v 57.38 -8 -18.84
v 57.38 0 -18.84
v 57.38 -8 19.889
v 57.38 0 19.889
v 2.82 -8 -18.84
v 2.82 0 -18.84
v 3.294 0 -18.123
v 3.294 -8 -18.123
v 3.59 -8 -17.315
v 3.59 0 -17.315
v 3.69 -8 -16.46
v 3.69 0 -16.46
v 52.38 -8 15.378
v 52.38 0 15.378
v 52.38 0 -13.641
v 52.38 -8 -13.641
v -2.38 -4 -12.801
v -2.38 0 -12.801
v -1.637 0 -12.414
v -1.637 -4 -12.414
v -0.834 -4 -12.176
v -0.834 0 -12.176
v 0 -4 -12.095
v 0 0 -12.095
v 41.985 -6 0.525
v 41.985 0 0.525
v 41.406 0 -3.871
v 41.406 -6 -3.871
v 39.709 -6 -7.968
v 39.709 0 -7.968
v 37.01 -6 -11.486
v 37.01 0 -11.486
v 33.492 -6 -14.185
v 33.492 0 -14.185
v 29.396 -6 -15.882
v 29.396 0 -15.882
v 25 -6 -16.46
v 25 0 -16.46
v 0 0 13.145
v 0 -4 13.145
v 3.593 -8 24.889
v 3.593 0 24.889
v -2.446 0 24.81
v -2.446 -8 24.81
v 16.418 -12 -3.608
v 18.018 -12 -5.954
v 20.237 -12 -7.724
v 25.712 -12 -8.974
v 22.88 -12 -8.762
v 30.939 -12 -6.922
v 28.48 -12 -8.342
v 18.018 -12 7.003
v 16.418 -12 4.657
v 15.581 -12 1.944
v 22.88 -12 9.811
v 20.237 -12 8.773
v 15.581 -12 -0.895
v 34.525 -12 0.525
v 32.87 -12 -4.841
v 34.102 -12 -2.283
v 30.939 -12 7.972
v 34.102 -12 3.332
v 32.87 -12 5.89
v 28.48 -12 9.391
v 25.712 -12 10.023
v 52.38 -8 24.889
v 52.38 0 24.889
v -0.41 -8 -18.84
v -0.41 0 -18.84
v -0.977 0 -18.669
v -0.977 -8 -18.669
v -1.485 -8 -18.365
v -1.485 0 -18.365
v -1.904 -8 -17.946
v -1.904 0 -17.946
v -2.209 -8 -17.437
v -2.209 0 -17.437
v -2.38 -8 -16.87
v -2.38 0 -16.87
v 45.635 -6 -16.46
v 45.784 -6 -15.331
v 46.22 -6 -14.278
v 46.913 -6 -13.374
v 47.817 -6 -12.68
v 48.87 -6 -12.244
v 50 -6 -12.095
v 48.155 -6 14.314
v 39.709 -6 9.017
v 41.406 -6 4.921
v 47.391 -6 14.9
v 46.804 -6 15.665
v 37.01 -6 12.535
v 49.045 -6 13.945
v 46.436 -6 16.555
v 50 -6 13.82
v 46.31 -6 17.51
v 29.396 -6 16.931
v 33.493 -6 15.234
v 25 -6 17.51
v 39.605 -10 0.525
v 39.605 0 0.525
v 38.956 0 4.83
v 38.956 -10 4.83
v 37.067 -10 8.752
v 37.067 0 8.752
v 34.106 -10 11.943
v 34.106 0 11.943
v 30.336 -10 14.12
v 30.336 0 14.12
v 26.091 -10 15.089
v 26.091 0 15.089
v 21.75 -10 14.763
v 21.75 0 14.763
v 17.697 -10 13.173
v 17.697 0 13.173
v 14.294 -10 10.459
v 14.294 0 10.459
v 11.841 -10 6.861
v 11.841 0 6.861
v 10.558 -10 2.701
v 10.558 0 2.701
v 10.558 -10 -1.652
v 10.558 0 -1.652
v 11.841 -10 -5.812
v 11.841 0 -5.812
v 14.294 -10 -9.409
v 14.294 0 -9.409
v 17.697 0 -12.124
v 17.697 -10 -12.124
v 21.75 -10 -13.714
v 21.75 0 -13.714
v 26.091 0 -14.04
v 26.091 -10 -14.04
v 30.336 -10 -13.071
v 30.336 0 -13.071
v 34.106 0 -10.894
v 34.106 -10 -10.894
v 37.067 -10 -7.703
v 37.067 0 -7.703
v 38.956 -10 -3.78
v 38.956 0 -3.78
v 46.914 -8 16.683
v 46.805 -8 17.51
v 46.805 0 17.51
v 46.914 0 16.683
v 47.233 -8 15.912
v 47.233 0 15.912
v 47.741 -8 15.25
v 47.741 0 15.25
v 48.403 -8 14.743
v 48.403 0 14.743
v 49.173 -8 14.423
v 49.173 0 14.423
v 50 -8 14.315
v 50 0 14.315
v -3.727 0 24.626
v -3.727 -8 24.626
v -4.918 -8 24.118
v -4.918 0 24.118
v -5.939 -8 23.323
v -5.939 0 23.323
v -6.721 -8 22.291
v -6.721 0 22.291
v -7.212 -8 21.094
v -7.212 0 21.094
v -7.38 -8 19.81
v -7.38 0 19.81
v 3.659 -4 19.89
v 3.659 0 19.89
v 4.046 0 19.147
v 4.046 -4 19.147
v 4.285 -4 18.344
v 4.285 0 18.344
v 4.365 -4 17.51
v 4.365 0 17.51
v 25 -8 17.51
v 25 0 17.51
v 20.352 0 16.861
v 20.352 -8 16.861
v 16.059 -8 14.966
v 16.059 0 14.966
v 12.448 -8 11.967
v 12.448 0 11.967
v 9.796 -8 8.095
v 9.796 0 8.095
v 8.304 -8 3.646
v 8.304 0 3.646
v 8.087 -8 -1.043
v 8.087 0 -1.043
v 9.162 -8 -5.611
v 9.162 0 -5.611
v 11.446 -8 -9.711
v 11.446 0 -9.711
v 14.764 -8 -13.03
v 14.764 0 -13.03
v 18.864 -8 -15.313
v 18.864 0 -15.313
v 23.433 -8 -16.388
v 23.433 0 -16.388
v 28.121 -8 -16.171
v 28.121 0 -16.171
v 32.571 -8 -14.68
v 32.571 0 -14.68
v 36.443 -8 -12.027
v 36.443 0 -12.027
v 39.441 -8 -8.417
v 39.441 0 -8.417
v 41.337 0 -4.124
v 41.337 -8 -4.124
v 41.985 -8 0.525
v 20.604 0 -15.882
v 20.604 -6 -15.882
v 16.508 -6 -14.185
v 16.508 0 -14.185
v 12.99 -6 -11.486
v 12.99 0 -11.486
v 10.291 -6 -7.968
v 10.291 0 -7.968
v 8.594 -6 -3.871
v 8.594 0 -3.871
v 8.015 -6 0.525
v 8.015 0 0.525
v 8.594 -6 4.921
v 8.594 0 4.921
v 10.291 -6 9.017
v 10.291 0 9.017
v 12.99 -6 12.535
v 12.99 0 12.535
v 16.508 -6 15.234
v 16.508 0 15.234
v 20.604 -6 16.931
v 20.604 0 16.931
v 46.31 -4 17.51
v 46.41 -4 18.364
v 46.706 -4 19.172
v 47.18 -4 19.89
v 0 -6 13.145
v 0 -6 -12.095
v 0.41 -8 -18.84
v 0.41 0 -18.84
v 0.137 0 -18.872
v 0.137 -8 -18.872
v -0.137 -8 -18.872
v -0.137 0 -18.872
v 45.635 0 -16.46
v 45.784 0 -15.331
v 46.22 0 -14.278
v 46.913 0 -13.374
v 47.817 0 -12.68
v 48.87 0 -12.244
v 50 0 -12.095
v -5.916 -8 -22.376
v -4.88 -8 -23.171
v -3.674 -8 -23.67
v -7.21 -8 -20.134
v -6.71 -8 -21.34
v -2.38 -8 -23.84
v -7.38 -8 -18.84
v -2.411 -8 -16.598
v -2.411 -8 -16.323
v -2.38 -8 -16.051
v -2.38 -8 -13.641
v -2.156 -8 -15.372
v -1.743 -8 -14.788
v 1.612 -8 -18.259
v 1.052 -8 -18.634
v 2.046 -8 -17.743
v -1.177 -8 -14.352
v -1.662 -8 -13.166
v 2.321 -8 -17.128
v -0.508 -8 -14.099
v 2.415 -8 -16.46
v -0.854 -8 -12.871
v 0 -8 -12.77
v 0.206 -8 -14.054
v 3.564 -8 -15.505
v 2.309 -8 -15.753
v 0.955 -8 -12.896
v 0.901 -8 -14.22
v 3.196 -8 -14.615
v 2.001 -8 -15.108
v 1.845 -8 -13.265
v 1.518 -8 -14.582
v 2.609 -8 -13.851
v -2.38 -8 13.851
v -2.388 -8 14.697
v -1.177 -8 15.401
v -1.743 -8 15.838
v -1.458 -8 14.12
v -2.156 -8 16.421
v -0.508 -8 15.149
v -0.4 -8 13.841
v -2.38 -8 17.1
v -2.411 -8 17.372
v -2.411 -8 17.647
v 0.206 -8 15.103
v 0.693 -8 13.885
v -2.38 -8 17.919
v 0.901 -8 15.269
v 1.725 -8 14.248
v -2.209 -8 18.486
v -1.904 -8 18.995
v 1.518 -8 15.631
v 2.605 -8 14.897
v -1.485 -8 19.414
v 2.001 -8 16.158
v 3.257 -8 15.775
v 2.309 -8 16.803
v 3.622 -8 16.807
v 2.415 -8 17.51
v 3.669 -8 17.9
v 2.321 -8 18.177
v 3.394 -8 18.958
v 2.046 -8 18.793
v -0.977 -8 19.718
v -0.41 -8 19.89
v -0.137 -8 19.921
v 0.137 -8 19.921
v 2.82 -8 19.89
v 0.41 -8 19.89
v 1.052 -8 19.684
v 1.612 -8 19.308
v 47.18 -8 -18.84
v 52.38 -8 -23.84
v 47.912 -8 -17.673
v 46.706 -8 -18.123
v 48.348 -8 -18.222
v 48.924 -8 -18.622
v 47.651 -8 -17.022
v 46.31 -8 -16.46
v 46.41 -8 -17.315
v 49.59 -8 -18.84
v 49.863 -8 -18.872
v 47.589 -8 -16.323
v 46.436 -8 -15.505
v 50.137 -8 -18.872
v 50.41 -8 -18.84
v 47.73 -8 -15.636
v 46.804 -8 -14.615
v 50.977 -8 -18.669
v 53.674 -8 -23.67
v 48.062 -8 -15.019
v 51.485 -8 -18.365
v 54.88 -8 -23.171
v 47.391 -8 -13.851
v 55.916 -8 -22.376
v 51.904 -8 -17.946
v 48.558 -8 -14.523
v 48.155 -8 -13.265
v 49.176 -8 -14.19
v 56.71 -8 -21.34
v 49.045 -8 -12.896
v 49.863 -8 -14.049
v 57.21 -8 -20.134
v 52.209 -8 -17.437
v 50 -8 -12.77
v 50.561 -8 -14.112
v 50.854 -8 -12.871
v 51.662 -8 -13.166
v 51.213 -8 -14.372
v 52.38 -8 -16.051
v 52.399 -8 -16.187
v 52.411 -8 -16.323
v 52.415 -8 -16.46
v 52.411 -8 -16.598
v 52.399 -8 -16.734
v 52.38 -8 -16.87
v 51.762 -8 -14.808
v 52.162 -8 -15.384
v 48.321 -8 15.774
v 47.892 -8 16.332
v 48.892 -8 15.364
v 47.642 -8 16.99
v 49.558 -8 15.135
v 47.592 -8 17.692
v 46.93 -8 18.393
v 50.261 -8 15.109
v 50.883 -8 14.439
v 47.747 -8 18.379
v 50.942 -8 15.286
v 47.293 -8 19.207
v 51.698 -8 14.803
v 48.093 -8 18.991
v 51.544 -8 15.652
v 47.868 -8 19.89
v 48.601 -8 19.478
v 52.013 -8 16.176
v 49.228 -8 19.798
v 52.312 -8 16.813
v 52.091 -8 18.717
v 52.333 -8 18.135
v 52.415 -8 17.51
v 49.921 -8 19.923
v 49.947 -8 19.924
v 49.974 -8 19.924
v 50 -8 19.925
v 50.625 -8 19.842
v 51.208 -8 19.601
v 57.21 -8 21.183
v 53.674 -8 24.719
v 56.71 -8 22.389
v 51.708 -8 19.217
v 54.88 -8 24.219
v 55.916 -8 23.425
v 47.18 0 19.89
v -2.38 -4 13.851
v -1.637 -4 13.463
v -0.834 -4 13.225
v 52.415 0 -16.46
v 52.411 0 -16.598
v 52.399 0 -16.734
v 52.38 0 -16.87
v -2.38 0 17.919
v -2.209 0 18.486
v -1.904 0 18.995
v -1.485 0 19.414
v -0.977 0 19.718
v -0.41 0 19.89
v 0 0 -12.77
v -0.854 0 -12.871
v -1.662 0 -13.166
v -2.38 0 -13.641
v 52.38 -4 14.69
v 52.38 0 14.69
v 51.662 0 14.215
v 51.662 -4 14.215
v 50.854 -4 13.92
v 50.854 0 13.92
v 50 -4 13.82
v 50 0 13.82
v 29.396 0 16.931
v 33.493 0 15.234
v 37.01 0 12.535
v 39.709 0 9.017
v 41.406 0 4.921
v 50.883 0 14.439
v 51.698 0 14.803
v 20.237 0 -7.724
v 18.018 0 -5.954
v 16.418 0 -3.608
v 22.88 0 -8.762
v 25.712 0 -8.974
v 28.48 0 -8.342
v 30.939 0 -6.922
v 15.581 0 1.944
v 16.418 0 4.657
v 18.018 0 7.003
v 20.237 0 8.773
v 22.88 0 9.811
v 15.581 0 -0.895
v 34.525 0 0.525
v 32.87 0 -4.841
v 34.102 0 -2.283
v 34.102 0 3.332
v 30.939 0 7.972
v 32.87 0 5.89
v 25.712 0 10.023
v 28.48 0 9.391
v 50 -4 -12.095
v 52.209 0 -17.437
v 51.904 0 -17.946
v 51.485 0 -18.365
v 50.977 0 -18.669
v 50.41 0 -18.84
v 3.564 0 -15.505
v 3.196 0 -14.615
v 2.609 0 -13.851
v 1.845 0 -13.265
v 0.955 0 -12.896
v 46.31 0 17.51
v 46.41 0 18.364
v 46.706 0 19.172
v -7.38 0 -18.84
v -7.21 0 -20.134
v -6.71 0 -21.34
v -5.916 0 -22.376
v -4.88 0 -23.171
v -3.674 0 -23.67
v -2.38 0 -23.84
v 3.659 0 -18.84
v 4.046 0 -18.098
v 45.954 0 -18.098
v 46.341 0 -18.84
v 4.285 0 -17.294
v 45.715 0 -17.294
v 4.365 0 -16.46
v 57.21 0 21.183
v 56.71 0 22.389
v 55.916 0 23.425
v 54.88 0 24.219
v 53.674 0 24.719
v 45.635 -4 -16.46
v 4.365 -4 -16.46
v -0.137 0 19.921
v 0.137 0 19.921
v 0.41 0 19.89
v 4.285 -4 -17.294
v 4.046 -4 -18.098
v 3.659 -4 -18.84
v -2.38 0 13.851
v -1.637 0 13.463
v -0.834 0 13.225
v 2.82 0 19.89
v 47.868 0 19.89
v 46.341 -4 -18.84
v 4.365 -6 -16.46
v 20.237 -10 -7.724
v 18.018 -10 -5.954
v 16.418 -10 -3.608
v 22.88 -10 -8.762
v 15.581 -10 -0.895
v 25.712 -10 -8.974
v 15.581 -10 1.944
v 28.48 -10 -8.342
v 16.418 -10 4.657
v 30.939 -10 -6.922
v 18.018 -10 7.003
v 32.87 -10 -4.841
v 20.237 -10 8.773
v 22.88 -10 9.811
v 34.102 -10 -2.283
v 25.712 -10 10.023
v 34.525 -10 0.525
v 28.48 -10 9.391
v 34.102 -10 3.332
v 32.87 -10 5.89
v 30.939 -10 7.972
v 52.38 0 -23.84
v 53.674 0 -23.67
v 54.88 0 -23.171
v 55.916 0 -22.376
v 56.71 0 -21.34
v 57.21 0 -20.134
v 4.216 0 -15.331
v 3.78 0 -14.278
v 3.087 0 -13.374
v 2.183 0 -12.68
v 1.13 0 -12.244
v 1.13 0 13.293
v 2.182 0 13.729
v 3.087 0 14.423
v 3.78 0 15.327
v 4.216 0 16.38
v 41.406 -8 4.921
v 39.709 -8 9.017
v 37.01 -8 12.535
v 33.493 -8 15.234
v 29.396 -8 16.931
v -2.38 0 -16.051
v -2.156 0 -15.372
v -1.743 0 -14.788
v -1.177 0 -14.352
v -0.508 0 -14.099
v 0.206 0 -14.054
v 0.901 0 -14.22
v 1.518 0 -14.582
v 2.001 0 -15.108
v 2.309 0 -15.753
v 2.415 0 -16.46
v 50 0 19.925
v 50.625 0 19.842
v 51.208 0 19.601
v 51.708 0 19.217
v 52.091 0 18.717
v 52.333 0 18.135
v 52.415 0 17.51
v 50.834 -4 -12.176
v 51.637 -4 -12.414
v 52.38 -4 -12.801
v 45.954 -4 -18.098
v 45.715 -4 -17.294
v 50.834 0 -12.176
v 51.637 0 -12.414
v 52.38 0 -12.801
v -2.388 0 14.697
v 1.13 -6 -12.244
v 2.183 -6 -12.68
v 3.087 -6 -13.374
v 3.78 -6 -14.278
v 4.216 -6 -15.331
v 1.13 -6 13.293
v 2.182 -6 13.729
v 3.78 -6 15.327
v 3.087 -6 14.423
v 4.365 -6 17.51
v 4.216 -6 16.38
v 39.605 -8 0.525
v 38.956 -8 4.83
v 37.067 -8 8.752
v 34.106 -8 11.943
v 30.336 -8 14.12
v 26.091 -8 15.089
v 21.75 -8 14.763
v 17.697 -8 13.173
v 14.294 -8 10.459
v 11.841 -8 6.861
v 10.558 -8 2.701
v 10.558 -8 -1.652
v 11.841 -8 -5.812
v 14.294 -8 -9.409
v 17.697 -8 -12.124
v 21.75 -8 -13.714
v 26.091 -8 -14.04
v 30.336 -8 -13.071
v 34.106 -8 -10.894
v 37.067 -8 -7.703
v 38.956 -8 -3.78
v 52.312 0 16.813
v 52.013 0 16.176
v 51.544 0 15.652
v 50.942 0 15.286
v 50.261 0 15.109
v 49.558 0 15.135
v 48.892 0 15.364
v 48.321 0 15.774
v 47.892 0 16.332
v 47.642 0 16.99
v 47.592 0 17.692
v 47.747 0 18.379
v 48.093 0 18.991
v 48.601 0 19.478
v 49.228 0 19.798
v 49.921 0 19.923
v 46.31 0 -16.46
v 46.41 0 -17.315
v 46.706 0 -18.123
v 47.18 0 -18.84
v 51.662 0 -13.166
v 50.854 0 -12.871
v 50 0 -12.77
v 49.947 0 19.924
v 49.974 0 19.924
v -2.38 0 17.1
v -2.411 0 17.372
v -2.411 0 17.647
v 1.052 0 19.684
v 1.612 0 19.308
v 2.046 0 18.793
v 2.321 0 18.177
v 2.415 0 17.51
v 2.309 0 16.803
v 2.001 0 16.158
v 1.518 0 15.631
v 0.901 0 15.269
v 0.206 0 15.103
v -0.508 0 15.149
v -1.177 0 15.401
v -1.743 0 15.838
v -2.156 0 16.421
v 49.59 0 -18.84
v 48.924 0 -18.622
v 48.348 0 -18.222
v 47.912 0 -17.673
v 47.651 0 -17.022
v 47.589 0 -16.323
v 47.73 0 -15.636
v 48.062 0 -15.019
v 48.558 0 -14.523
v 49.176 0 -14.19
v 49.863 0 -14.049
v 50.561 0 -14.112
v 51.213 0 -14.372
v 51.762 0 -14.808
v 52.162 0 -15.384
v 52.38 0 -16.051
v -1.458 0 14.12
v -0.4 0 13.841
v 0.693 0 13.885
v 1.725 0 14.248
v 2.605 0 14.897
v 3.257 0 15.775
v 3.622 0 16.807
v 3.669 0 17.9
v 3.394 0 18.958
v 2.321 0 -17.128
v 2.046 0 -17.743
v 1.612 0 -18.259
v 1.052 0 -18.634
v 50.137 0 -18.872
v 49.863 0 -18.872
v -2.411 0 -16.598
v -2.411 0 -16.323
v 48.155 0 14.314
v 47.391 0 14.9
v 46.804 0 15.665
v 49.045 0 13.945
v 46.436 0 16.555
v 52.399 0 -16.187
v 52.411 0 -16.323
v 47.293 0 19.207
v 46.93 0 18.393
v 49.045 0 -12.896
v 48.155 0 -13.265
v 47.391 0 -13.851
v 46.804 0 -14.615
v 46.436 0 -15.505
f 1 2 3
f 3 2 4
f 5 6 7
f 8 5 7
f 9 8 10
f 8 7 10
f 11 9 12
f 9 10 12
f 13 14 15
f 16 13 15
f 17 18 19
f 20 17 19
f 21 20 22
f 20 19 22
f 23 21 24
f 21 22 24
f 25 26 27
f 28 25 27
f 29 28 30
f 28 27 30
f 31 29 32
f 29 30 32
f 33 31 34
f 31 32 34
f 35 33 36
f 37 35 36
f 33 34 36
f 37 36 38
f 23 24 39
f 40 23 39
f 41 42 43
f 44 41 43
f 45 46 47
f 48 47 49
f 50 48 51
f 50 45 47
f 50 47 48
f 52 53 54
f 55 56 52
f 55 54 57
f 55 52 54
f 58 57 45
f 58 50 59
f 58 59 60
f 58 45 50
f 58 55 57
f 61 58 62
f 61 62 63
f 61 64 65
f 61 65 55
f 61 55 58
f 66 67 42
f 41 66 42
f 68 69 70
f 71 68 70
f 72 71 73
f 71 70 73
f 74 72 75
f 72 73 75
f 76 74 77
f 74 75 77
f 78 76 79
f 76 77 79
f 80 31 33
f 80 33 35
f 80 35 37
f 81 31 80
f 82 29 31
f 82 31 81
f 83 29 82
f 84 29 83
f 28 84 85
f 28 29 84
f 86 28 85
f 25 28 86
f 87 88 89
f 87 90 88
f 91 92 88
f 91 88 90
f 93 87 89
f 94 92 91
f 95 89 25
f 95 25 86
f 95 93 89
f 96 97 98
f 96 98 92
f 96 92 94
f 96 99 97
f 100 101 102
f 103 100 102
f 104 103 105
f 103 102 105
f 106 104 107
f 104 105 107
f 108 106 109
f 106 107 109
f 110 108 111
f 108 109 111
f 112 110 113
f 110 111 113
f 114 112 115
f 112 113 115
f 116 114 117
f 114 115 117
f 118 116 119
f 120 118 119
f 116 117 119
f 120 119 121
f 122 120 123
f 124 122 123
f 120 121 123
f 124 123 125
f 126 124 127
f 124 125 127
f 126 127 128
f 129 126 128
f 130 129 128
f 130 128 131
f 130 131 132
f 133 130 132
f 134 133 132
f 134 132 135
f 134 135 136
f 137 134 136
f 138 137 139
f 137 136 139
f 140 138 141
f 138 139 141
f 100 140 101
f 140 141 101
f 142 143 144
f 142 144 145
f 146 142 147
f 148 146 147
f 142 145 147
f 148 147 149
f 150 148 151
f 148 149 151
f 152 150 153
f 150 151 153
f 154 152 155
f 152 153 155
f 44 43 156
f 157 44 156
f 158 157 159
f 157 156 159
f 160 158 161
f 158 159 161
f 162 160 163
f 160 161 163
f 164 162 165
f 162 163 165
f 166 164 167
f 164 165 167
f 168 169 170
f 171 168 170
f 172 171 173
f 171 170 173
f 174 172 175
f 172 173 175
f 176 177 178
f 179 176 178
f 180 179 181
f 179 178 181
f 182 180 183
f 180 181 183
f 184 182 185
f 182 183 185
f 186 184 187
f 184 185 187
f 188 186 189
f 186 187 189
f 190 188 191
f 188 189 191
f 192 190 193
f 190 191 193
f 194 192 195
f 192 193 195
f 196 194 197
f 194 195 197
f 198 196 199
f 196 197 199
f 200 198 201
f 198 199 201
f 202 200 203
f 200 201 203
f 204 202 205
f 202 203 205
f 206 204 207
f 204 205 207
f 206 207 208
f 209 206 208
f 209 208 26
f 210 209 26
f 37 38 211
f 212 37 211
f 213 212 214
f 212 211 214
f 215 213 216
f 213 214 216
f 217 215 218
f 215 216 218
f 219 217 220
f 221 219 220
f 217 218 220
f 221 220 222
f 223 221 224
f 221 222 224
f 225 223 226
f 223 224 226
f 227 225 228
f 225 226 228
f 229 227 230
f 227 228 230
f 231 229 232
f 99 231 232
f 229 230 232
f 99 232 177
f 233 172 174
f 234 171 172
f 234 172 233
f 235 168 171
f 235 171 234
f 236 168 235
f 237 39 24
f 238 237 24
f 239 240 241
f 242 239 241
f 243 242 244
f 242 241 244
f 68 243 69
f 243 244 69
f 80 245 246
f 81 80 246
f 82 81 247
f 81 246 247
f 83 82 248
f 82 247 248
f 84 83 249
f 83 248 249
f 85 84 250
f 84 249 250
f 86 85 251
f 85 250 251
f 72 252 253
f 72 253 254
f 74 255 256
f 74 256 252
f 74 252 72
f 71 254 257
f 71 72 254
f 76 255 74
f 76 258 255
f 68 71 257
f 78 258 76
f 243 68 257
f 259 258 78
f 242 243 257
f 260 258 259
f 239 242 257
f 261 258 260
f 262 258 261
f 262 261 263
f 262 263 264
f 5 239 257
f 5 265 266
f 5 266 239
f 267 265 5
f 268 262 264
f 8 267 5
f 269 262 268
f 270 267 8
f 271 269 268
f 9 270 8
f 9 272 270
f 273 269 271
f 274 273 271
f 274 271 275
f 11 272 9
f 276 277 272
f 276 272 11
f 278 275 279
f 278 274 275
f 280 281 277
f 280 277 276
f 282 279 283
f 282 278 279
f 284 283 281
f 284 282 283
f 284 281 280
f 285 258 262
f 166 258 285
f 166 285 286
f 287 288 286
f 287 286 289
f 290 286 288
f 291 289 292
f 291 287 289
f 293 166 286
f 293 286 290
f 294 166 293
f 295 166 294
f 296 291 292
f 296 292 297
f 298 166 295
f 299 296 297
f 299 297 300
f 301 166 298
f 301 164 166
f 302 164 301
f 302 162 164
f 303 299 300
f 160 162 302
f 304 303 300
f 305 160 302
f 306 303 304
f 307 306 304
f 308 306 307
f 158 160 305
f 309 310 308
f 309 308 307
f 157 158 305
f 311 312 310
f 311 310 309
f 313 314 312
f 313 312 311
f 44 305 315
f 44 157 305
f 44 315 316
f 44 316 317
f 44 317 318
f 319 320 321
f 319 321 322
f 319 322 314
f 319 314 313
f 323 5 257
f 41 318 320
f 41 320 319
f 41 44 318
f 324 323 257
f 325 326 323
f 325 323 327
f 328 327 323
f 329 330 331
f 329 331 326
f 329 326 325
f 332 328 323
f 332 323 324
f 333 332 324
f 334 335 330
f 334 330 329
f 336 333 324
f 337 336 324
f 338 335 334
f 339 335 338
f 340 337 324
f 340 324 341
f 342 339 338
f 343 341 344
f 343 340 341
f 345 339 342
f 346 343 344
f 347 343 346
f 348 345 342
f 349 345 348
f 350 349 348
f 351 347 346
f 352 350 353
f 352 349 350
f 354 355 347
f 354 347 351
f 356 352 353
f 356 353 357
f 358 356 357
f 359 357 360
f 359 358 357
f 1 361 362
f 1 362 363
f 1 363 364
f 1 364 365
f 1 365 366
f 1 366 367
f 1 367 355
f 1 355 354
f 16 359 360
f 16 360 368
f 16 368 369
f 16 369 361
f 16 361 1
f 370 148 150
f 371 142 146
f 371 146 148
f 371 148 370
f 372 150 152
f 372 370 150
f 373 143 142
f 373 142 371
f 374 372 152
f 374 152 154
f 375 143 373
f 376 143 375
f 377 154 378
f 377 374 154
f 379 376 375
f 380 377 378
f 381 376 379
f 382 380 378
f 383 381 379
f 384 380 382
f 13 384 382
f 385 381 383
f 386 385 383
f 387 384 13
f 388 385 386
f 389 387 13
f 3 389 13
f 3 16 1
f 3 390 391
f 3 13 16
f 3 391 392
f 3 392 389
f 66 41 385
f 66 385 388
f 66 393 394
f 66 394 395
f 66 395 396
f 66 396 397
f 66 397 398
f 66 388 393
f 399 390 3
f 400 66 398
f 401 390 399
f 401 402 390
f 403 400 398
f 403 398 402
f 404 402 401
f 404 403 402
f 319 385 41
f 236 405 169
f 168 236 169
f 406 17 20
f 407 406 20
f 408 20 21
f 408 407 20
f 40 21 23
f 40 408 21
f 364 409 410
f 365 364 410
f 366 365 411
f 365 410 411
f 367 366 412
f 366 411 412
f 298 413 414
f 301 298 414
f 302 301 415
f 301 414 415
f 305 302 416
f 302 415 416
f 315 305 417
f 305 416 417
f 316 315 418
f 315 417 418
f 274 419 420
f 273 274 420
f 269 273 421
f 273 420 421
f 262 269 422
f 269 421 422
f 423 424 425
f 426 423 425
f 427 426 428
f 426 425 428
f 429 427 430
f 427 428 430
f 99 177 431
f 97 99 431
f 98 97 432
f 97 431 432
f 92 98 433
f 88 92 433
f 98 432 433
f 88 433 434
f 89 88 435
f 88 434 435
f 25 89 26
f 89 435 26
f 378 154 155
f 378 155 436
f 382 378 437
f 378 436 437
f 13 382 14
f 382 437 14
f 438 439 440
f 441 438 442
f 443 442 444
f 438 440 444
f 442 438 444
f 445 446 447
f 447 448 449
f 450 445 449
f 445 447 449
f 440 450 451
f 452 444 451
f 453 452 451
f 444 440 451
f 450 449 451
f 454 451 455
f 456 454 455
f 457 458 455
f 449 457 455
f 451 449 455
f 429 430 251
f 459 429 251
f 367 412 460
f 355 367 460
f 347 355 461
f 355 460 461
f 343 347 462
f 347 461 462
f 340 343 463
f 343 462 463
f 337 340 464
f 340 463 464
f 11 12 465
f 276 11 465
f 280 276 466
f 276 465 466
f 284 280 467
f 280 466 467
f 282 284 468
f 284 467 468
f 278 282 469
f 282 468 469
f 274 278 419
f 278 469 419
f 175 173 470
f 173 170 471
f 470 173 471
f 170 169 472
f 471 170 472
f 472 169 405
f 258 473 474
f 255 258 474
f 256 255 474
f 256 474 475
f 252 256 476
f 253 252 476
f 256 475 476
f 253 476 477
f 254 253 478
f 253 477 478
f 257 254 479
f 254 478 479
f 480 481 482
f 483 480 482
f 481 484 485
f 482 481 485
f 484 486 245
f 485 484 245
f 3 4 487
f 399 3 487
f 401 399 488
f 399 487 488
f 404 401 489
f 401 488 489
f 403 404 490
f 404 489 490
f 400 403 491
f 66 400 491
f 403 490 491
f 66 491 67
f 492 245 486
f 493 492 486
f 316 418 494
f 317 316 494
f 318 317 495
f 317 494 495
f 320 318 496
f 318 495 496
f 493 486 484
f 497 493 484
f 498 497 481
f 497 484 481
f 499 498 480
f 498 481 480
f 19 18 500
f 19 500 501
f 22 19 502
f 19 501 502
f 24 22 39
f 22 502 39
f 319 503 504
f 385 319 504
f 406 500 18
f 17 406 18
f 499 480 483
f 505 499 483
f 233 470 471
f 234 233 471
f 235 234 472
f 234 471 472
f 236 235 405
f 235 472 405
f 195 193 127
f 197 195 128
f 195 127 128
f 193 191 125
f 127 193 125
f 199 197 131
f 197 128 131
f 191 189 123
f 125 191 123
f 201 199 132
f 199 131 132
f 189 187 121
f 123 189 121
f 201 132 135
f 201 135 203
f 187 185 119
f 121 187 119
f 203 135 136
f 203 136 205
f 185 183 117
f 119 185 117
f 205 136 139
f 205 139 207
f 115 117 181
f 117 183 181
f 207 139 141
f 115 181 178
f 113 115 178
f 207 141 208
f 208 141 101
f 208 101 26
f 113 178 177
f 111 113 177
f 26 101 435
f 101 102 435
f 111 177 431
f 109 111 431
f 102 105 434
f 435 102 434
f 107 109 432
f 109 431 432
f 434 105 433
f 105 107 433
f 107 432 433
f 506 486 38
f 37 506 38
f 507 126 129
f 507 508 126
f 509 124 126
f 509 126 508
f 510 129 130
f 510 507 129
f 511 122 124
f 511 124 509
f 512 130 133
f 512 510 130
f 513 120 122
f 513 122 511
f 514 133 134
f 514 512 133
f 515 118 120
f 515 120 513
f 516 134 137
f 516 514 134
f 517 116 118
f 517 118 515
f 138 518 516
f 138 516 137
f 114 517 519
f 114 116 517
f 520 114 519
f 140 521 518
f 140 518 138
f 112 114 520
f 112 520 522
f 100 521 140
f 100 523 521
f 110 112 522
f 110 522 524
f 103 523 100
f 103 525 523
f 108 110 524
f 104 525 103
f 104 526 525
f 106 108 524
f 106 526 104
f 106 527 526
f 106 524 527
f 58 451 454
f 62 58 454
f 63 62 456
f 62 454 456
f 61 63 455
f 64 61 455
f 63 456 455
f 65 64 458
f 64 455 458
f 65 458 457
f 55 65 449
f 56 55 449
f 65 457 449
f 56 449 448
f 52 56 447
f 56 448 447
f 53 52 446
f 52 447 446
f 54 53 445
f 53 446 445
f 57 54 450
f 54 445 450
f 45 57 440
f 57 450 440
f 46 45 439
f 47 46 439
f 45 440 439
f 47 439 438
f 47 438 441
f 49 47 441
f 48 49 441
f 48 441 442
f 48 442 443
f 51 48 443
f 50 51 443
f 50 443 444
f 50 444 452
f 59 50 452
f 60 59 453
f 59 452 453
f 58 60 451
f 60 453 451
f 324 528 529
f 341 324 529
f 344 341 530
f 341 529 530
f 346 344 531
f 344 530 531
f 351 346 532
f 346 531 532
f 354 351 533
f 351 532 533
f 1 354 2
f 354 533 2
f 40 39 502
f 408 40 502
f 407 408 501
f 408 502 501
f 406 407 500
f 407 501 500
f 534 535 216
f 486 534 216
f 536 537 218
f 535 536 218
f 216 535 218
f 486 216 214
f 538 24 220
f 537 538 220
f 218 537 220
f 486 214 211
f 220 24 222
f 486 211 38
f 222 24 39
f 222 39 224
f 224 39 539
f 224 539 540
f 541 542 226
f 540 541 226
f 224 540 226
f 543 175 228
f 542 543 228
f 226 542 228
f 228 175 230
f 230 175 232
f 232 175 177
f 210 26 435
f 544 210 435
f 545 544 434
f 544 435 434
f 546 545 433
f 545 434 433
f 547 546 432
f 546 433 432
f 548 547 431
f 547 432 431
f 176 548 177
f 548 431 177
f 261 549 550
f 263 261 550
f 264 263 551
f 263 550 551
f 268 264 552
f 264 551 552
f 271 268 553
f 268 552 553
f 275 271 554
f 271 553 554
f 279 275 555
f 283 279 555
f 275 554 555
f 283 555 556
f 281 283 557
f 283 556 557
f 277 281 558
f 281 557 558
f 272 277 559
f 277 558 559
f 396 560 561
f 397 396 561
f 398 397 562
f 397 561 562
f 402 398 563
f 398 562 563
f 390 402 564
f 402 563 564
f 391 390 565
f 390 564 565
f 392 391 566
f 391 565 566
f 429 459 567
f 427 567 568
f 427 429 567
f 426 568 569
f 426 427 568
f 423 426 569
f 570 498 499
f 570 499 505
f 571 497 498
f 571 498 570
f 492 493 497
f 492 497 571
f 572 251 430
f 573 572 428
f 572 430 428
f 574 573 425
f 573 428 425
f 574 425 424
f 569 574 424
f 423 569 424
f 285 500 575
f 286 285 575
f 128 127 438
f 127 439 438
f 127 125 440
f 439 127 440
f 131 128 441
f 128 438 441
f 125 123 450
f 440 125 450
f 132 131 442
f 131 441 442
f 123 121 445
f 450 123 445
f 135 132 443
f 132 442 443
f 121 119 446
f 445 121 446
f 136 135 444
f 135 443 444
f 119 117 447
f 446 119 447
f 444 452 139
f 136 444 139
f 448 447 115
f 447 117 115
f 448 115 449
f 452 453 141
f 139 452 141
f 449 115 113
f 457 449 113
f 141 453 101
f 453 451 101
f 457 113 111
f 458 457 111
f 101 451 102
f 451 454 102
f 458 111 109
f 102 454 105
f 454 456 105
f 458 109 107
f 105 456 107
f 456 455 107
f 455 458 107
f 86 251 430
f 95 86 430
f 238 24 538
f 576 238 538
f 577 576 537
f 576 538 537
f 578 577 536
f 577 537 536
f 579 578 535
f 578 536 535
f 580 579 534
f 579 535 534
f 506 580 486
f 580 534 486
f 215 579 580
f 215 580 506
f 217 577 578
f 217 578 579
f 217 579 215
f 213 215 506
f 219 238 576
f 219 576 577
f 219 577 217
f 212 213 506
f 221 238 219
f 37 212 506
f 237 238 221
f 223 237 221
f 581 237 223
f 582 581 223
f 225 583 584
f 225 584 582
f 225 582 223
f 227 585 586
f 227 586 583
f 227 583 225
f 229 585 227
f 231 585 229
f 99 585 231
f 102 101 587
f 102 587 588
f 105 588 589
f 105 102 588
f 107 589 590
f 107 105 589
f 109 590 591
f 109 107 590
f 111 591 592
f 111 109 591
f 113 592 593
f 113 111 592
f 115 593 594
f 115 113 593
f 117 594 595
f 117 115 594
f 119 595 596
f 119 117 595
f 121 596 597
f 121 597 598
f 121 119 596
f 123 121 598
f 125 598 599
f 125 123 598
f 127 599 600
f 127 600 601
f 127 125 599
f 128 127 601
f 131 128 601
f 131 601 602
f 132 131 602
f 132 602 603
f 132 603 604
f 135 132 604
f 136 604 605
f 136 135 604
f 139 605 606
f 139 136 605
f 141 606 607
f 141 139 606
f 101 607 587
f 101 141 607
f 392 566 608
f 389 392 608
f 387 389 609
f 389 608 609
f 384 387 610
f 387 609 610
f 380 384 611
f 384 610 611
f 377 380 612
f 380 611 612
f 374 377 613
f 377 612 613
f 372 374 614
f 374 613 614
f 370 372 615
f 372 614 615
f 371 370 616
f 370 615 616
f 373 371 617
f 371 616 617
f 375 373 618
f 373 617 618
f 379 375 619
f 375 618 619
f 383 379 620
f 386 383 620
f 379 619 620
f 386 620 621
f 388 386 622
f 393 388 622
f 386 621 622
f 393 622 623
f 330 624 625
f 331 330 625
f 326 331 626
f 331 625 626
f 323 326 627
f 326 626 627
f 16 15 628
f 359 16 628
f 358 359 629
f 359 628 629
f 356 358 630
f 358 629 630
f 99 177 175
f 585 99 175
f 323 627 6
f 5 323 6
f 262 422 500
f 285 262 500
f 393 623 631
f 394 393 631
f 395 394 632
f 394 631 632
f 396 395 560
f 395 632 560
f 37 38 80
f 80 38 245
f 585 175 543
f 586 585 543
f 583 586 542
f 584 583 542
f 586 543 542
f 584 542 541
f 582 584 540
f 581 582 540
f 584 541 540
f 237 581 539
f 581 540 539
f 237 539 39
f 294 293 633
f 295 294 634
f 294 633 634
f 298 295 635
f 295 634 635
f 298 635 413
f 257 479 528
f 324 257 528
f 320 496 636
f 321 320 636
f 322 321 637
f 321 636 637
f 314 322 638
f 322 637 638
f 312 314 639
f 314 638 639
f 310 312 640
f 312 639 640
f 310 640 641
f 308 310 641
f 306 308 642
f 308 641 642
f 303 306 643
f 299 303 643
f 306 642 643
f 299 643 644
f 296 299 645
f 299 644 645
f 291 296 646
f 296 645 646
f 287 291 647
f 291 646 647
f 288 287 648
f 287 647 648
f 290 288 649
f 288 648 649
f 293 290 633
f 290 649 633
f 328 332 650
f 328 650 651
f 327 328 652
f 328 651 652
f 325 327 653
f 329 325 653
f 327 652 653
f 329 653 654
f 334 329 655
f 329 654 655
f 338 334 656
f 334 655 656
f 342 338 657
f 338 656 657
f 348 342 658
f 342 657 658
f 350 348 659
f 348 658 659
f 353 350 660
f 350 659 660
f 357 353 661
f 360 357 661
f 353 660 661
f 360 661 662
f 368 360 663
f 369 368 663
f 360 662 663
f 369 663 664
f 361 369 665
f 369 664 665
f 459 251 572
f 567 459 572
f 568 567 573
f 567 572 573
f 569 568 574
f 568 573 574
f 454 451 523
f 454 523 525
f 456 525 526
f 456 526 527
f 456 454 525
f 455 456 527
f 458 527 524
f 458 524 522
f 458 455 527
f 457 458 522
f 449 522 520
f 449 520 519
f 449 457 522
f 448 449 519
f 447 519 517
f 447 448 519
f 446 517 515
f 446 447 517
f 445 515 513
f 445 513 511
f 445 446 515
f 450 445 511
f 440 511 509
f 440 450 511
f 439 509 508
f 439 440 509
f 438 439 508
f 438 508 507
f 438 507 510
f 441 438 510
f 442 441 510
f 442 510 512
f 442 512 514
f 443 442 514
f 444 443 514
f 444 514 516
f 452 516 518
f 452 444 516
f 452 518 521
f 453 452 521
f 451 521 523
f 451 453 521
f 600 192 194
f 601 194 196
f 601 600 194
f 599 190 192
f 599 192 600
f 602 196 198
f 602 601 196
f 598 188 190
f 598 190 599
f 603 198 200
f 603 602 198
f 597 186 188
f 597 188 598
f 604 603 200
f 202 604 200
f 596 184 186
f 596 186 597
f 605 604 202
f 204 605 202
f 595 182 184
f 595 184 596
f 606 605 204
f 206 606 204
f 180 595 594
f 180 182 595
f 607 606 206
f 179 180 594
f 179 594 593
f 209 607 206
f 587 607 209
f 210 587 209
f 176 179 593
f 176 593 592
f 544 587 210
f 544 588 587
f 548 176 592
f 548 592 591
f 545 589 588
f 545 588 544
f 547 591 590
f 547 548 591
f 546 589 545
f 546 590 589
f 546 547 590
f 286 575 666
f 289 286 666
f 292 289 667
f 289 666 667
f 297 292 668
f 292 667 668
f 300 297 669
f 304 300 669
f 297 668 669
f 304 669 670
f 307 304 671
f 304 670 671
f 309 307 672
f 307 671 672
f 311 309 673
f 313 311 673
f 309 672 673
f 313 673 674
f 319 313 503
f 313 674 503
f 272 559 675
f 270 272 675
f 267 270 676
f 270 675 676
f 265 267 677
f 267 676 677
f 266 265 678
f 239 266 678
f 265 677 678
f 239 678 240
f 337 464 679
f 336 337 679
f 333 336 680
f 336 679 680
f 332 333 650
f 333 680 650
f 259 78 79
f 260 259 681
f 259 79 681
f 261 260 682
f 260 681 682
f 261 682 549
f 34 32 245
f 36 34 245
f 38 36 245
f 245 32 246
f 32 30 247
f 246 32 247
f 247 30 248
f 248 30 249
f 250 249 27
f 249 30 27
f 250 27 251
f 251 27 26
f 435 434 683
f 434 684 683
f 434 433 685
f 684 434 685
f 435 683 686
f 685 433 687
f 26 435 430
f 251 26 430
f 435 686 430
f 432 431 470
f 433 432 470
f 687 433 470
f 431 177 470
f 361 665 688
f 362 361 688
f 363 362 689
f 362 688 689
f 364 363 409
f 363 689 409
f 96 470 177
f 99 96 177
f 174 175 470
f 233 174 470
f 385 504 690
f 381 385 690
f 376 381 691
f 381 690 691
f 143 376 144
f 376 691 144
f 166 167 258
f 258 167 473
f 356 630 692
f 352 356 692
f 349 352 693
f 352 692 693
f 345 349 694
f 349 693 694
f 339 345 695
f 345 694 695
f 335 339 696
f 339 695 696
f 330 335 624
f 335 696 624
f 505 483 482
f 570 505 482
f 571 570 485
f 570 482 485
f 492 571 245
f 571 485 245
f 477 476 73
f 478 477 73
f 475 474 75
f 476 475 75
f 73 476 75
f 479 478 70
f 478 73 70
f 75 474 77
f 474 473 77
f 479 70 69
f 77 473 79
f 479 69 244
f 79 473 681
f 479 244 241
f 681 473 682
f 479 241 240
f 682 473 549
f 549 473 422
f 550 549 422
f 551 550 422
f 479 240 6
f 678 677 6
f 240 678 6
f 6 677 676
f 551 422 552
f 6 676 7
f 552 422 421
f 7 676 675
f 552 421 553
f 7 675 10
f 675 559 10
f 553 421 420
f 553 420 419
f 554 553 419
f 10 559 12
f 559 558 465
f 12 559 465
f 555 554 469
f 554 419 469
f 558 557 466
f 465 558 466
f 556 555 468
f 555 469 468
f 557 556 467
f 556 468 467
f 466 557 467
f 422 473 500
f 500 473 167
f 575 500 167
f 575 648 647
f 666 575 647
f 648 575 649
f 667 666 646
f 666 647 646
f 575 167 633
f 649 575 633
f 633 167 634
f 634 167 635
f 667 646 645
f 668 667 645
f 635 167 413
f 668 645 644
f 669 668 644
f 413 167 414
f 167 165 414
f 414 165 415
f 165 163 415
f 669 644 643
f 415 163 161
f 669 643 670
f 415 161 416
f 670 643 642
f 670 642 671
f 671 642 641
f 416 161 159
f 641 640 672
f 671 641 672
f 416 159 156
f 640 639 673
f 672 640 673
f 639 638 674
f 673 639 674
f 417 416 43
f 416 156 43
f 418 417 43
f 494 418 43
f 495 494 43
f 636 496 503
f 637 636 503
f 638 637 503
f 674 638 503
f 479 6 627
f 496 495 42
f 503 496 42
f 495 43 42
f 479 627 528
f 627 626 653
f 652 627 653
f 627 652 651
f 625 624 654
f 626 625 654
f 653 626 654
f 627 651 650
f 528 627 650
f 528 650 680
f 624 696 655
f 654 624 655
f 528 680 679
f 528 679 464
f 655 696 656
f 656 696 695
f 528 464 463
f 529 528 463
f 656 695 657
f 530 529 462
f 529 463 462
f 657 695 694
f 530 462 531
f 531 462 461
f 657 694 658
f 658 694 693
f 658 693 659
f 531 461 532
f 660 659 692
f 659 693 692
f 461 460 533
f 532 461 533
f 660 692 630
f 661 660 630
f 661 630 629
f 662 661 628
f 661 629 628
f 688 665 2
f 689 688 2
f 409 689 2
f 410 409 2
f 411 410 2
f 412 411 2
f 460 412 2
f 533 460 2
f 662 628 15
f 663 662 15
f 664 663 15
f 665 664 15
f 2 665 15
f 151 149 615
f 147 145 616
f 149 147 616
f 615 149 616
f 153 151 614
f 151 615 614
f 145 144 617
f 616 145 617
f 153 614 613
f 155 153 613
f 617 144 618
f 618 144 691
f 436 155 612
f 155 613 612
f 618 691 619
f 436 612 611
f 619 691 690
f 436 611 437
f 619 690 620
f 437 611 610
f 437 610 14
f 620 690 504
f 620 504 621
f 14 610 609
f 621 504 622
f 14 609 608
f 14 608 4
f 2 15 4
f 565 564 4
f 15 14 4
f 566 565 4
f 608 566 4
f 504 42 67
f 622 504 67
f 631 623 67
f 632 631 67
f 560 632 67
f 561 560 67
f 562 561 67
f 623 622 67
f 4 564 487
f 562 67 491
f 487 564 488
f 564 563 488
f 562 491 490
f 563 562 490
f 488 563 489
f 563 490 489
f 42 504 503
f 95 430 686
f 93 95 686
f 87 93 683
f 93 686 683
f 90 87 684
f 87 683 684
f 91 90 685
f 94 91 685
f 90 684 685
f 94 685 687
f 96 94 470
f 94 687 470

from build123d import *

# Parameters (mm, degrees)
F0_R     = 9.525
F1_DEPTH = 12
F3_DEPTH = 6
F0_R_2   = 14.605
F4_DEPTH = 8
F5_DEPTH = 10
F6_DEPTH = 8
F7_DEPTH = 4


# Not quite as in the source:
# - a feature of the source that left no trace in its solid (it failed there, or was rolled back) is left out


with BuildPart() as f1:
    # F0 (on Front) → F1 (new body)
    with BuildSketch(Plane.XZ):
        with Locations((25, 0.5246010458)):
            Circle(F0_R)
    extrude(amount=F1_DEPTH)


with BuildPart() as f3:
    # F0 (on Front) → F3 (new body)
    with BuildSketch(Plane.XZ):
        with BuildLine():
            ThreePointArc((25, -16.4603989542), (8.015, 0.5246010458), (25, 17.5096010458))
            Line((25, 17.5096010458), (6.92, 17.5096010458))
            Line((6.92, 17.5096010458), (4.365, 17.5096010458))
            ThreePointArc((4.365, 17.5096010458), (3.0865210999, 14.423079946), (0, 13.1446010458))
            Line((0, 13.1446010458), (0, 10.59))
            Line((0, 10.59), (0, 0))
            Line((0, 0), (0, -10.59))
            Line((0, -10.59), (0, -12.0953989542))
            ThreePointArc((0, -12.0953989542), (3.0865210999, -13.3738778543), (4.365, -16.4603989542))
            Line((4.365, -16.4603989542), (25, -16.4603989542))
        make_face()
    extrude(amount=F3_DEPTH)


with BuildPart() as f3b:
    # F0 (on Front) → F3, piece 2 (new body)
    with BuildSketch(Plane.XZ):
        with BuildLine():
            ThreePointArc((25, 17.5096010458), (37.0102086785, 12.5348097243), (41.985, 0.5246010458))
            ThreePointArc((41.985, 0.5246010458), (37.0102086785, -11.4856076326), (25, -16.4603989542))
            Line((25, -16.4603989542), (45.635, -16.4603989542))
            ThreePointArc((45.635, -16.4603989542), (46.9134789001, -13.3738778543), (50, -12.0953989542))
            Line((50, -12.0953989542), (50, 13.8196010458))
            ThreePointArc((50, 13.8196010458), (47.3907759774, 14.9003770233), (46.31, 17.5096010458))
            Line((46.31, 17.5096010458), (25, 17.5096010458))
        make_face()
    extrude(amount=F3_DEPTH)


with BuildPart() as f4:
    # F0 (on Front) → F4 (new body)
    with BuildSketch(Plane.XZ):
        with BuildLine():
            ThreePointArc((25, -16.4603989542), (37.0102086785, -11.4856076326), (41.985, 0.5246010458))
            ThreePointArc((41.985, 0.5246010458), (37.0102086785, 12.5348097243), (25, 17.5096010458))
            ThreePointArc((25, 17.5096010458), (8.015, 0.5246010458), (25, -16.4603989542))
        make_face()
        with Locations((25, 0.5246010458)):
            Circle(F0_R_2, mode=Mode.SUBTRACT)
    extrude(amount=F4_DEPTH)


with BuildPart() as f5:
    # F0 (on Front) → F5 (new body)
    with BuildSketch(Plane.XZ):
        with Locations((25, 0.5246010458)):
            Circle(F0_R_2)
        with Locations((25, 0.5246010458)):
            Circle(F0_R, mode=Mode.SUBTRACT)
    extrude(amount=F5_DEPTH)


with BuildPart() as f6:
    # F0 (on Front) → F6 (new body)
    with BuildSketch(Plane.XZ):
        with BuildLine():
            Line((-7.38, 19.8103227064), (-7.38, 0))
            Line((-7.38, 0), (-7.38, -18.8403989542))
            ThreePointArc((-7.38, -18.8403989542), (-5.9155339059, -22.3759328601), (-2.38, -23.8403989542))
            Line((-2.38, -23.8403989542), (52.38, -23.8403989542))
            ThreePointArc((52.38, -23.8403989542), (55.9155339059, -22.3759328601), (57.38, -18.8403989542))
            Line((57.38, -18.8403989542), (57.38, 0))
            Line((57.38, 0), (57.38, 19.8891702691))
            ThreePointArc((57.38, 19.8891702691), (55.9155339059, 23.4247041751), (52.38, 24.8891702691))
            Line((52.38, 24.8891702691), (3.5934421678, 24.8891702691))
            Line((3.5934421678, 24.8891702691), (-2.4456321687, 24.8098919297))
            ThreePointArc((-2.4456321687, 24.8098919297), (-5.9386627294, 23.3225754847), (-7.38, 19.8103227064))
        make_face()
        with BuildLine():
            ThreePointArc((-0.4096644969, -18.8403989542), (-1.7076628766, -18.1680618307), (-2.38, -16.870063451))
            ThreePointArc((-2.38, -16.870063451), (-2.415, -16.4603989542), (-2.38, -16.0507344573))
            ThreePointArc((-2.38, -16.0507344573), (0.2055784522, -14.0541648633), (2.415, -16.4603989542))
            ThreePointArc((2.415, -16.4603989542), (1.8468303604, -18.0164974793), (0.4096644969, -18.8403989542))
            ThreePointArc((0.4096644969, -18.8403989542), (0, -18.8753989542), (-0.4096644969, -18.8403989542))
        make_face(mode=Mode.SUBTRACT)
        with BuildLine():
            ThreePointArc((52.415, -16.4603989542), (52.4062340909, -16.6659774063), (52.38, -16.870063451))
            ThreePointArc((52.38, -16.870063451), (51.7076628766, -18.1680618307), (50.4096644969, -18.8403989542))
            ThreePointArc((50.4096644969, -18.8403989542), (50, -18.8753989542), (49.5903355031, -18.8403989542))
            ThreePointArc((49.5903355031, -18.8403989542), (48.2923371234, -14.7527360776), (52.38, -16.0507344573))
            ThreePointArc((52.38, -16.0507344573), (52.4062340909, -16.254820502), (52.415, -16.4603989542))
        make_face(mode=Mode.SUBTRACT)
        with BuildLine():
            ThreePointArc((47.8684219461, 19.8896010458), (47.0829452454, 18.8129876189), (46.805, 17.5096010458))
            ThreePointArc((46.805, 17.5096010458), (47.7407938341, 15.25039488), (50, 14.3146010458))
            ThreePointArc((50, 14.3146010458), (51.3033865731, 14.5925462913), (52.38, 15.3780229919))
            Line((52.38, 15.3780229919), (52.38, 14.6897251621))
            Line((52.38, 14.6897251621), (52.38, -12.8013246177))
            Line((52.38, -12.8013246177), (52.38, -13.6405230704))
            ThreePointArc((52.38, -13.6405230704), (51.2670355143, -12.9947502406), (50, -12.7703989542))
            ThreePointArc((50, -12.7703989542), (47.3907759774, -13.8511749316), (46.31, -16.4603989542))
            ThreePointArc((46.31, -16.4603989542), (46.5343512865, -17.7274344684), (47.1801241162, -18.8403989542))
            Line((47.1801241162, -18.8403989542), (46.3409256635, -18.8403989542))
            Line((46.3409256635, -18.8403989542), (3.6590743365, -18.8403989542))
            Line((3.6590743365, -18.8403989542), (2.8198758838, -18.8403989542))
            ThreePointArc((2.8198758838, -18.8403989542), (3.4656487135, -17.7274344684), (3.69, -16.4603989542))
            ThreePointArc((3.69, -16.4603989542), (2.6092240226, -13.8511749316), (0, -12.7703989542))
            ThreePointArc((0, -12.7703989542), (-1.2670355143, -12.9947502406), (-2.38, -13.6405230704))
            Line((-2.38, -13.6405230704), (-2.38, -12.8013246177))
            Line((-2.38, -12.8013246177), (-2.38, 13.8505267094))
            Line((-2.38, 13.8505267094), (-2.3881185942, 14.6965973878))
            ThreePointArc((-2.3881185942, 14.6965973878), (2.6054606766, 14.8966190975), (2.8198758838, 19.8896010458))
            Line((2.8198758838, 19.8896010458), (3.6590743365, 19.8896010458))
            Line((3.6590743365, 19.8896010458), (4.3602697551, 19.8896010458))
            Line((4.3602697551, 19.8896010458), (47.1801241162, 19.8896010458))
            Line((47.1801241162, 19.8896010458), (47.8684219461, 19.8896010458))
        make_face(mode=Mode.SUBTRACT)
        with BuildLine():
            ThreePointArc((2.415, 17.5096010458), (0.2055784522, 15.103366955), (-2.38, 17.099936549))
            ThreePointArc((-2.38, 17.099936549), (-2.415, 17.5096010458), (-2.38, 17.9192655427))
            ThreePointArc((-2.38, 17.9192655427), (-1.7076628766, 19.2172639224), (-0.4096644969, 19.8896010458))
            ThreePointArc((-0.4096644969, 19.8896010458), (0, 19.9246010458), (0.4096644969, 19.8896010458))
            ThreePointArc((0.4096644969, 19.8896010458), (1.8468303604, 19.065699571), (2.415, 17.5096010458))
        make_face(mode=Mode.SUBTRACT)
        with BuildLine():
            ThreePointArc((50, 19.9246010458), (51.7076628766, 19.2172639224), (52.415, 17.5096010458))
            ThreePointArc((52.415, 17.5096010458), (48.3206029126, 15.7741326875), (49.9207139355, 19.9232991877))
            ThreePointArc((49.9207139355, 19.9232991877), (49.9603516241, 19.9242755594), (50, 19.9246010458))
        make_face(mode=Mode.SUBTRACT)
    extrude(amount=F6_DEPTH)


with BuildPart() as f7:
    # F0 (on Front) → F7 (new body)
    with BuildSketch(Plane.XZ):
        with BuildLine():
            Line((45.635, -16.4603989542), (25, -16.4603989542))
            Line((25, -16.4603989542), (4.365, -16.4603989542))
            ThreePointArc((4.365, -16.4603989542), (4.1847989485, -17.7016413804), (3.6590743365, -18.8403989542))
            Line((3.6590743365, -18.8403989542), (46.3409256635, -18.8403989542))
            ThreePointArc((46.3409256635, -18.8403989542), (45.8152010515, -17.7016413804), (45.635, -16.4603989542))
        make_face()
    extrude(amount=F7_DEPTH)


with BuildPart() as f7b:
    # F0 (on Front) → F7, piece 2 (new body)
    with BuildSketch(Plane.XZ):
        with BuildLine():
            ThreePointArc((-2.38, -12.8013246177), (-1.2412424262, -12.2756000056), (0, -12.0953989542))
            Line((0, -12.0953989542), (0, -10.59))
            Line((0, -10.59), (0, 0))
            Line((0, 0), (0, 10.59))
            Line((0, 10.59), (0, 13.1446010458))
            ThreePointArc((0, 13.1446010458), (-1.2412424262, 13.3248020973), (-2.38, 13.8505267094))
            Line((-2.38, 13.8505267094), (-2.38, -12.8013246177))
        make_face()
    extrude(amount=F7_DEPTH)


with BuildPart() as f7c:
    # F0 (on Front) → F7, piece 3 (new body)
    with BuildSketch(Plane.XZ):
        with BuildLine():
            Line((6.92, 17.5096010458), (25, 17.5096010458))
            Line((25, 17.5096010458), (46.31, 17.5096010458))
            ThreePointArc((46.31, 17.5096010458), (46.5343512865, 18.7766365601), (47.1801241162, 19.8896010458))
            Line((47.1801241162, 19.8896010458), (4.3602697551, 19.8896010458))
            Line((4.3602697551, 19.8896010458), (3.6590743365, 19.8896010458))
            ThreePointArc((3.6590743365, 19.8896010458), (4.1847989485, 18.750843472), (4.365, 17.5096010458))
            Line((4.365, 17.5096010458), (6.92, 17.5096010458))
        make_face()
    extrude(amount=F7_DEPTH)


with BuildPart() as f7d:
    # F0 (on Front) → F7, piece 4 (new body)
    with BuildSketch(Plane.XZ):
        with BuildLine():
            ThreePointArc((52.38, 14.6897251621), (51.2670355143, 14.0439523323), (50, 13.8196010458))
            Line((50, 13.8196010458), (50, -12.0953989542))
            ThreePointArc((50, -12.0953989542), (51.2412424262, -12.2756000056), (52.38, -12.8013246177))
            Line((52.38, -12.8013246177), (52.38, 14.6897251621))
        make_face()
    extrude(amount=F7_DEPTH)


solid = Compound([f1.part, f3.part, f3b.part, f4.part, f5.part, f6.part, f7.part, f7b.part, f7c.part, f7d.part])
